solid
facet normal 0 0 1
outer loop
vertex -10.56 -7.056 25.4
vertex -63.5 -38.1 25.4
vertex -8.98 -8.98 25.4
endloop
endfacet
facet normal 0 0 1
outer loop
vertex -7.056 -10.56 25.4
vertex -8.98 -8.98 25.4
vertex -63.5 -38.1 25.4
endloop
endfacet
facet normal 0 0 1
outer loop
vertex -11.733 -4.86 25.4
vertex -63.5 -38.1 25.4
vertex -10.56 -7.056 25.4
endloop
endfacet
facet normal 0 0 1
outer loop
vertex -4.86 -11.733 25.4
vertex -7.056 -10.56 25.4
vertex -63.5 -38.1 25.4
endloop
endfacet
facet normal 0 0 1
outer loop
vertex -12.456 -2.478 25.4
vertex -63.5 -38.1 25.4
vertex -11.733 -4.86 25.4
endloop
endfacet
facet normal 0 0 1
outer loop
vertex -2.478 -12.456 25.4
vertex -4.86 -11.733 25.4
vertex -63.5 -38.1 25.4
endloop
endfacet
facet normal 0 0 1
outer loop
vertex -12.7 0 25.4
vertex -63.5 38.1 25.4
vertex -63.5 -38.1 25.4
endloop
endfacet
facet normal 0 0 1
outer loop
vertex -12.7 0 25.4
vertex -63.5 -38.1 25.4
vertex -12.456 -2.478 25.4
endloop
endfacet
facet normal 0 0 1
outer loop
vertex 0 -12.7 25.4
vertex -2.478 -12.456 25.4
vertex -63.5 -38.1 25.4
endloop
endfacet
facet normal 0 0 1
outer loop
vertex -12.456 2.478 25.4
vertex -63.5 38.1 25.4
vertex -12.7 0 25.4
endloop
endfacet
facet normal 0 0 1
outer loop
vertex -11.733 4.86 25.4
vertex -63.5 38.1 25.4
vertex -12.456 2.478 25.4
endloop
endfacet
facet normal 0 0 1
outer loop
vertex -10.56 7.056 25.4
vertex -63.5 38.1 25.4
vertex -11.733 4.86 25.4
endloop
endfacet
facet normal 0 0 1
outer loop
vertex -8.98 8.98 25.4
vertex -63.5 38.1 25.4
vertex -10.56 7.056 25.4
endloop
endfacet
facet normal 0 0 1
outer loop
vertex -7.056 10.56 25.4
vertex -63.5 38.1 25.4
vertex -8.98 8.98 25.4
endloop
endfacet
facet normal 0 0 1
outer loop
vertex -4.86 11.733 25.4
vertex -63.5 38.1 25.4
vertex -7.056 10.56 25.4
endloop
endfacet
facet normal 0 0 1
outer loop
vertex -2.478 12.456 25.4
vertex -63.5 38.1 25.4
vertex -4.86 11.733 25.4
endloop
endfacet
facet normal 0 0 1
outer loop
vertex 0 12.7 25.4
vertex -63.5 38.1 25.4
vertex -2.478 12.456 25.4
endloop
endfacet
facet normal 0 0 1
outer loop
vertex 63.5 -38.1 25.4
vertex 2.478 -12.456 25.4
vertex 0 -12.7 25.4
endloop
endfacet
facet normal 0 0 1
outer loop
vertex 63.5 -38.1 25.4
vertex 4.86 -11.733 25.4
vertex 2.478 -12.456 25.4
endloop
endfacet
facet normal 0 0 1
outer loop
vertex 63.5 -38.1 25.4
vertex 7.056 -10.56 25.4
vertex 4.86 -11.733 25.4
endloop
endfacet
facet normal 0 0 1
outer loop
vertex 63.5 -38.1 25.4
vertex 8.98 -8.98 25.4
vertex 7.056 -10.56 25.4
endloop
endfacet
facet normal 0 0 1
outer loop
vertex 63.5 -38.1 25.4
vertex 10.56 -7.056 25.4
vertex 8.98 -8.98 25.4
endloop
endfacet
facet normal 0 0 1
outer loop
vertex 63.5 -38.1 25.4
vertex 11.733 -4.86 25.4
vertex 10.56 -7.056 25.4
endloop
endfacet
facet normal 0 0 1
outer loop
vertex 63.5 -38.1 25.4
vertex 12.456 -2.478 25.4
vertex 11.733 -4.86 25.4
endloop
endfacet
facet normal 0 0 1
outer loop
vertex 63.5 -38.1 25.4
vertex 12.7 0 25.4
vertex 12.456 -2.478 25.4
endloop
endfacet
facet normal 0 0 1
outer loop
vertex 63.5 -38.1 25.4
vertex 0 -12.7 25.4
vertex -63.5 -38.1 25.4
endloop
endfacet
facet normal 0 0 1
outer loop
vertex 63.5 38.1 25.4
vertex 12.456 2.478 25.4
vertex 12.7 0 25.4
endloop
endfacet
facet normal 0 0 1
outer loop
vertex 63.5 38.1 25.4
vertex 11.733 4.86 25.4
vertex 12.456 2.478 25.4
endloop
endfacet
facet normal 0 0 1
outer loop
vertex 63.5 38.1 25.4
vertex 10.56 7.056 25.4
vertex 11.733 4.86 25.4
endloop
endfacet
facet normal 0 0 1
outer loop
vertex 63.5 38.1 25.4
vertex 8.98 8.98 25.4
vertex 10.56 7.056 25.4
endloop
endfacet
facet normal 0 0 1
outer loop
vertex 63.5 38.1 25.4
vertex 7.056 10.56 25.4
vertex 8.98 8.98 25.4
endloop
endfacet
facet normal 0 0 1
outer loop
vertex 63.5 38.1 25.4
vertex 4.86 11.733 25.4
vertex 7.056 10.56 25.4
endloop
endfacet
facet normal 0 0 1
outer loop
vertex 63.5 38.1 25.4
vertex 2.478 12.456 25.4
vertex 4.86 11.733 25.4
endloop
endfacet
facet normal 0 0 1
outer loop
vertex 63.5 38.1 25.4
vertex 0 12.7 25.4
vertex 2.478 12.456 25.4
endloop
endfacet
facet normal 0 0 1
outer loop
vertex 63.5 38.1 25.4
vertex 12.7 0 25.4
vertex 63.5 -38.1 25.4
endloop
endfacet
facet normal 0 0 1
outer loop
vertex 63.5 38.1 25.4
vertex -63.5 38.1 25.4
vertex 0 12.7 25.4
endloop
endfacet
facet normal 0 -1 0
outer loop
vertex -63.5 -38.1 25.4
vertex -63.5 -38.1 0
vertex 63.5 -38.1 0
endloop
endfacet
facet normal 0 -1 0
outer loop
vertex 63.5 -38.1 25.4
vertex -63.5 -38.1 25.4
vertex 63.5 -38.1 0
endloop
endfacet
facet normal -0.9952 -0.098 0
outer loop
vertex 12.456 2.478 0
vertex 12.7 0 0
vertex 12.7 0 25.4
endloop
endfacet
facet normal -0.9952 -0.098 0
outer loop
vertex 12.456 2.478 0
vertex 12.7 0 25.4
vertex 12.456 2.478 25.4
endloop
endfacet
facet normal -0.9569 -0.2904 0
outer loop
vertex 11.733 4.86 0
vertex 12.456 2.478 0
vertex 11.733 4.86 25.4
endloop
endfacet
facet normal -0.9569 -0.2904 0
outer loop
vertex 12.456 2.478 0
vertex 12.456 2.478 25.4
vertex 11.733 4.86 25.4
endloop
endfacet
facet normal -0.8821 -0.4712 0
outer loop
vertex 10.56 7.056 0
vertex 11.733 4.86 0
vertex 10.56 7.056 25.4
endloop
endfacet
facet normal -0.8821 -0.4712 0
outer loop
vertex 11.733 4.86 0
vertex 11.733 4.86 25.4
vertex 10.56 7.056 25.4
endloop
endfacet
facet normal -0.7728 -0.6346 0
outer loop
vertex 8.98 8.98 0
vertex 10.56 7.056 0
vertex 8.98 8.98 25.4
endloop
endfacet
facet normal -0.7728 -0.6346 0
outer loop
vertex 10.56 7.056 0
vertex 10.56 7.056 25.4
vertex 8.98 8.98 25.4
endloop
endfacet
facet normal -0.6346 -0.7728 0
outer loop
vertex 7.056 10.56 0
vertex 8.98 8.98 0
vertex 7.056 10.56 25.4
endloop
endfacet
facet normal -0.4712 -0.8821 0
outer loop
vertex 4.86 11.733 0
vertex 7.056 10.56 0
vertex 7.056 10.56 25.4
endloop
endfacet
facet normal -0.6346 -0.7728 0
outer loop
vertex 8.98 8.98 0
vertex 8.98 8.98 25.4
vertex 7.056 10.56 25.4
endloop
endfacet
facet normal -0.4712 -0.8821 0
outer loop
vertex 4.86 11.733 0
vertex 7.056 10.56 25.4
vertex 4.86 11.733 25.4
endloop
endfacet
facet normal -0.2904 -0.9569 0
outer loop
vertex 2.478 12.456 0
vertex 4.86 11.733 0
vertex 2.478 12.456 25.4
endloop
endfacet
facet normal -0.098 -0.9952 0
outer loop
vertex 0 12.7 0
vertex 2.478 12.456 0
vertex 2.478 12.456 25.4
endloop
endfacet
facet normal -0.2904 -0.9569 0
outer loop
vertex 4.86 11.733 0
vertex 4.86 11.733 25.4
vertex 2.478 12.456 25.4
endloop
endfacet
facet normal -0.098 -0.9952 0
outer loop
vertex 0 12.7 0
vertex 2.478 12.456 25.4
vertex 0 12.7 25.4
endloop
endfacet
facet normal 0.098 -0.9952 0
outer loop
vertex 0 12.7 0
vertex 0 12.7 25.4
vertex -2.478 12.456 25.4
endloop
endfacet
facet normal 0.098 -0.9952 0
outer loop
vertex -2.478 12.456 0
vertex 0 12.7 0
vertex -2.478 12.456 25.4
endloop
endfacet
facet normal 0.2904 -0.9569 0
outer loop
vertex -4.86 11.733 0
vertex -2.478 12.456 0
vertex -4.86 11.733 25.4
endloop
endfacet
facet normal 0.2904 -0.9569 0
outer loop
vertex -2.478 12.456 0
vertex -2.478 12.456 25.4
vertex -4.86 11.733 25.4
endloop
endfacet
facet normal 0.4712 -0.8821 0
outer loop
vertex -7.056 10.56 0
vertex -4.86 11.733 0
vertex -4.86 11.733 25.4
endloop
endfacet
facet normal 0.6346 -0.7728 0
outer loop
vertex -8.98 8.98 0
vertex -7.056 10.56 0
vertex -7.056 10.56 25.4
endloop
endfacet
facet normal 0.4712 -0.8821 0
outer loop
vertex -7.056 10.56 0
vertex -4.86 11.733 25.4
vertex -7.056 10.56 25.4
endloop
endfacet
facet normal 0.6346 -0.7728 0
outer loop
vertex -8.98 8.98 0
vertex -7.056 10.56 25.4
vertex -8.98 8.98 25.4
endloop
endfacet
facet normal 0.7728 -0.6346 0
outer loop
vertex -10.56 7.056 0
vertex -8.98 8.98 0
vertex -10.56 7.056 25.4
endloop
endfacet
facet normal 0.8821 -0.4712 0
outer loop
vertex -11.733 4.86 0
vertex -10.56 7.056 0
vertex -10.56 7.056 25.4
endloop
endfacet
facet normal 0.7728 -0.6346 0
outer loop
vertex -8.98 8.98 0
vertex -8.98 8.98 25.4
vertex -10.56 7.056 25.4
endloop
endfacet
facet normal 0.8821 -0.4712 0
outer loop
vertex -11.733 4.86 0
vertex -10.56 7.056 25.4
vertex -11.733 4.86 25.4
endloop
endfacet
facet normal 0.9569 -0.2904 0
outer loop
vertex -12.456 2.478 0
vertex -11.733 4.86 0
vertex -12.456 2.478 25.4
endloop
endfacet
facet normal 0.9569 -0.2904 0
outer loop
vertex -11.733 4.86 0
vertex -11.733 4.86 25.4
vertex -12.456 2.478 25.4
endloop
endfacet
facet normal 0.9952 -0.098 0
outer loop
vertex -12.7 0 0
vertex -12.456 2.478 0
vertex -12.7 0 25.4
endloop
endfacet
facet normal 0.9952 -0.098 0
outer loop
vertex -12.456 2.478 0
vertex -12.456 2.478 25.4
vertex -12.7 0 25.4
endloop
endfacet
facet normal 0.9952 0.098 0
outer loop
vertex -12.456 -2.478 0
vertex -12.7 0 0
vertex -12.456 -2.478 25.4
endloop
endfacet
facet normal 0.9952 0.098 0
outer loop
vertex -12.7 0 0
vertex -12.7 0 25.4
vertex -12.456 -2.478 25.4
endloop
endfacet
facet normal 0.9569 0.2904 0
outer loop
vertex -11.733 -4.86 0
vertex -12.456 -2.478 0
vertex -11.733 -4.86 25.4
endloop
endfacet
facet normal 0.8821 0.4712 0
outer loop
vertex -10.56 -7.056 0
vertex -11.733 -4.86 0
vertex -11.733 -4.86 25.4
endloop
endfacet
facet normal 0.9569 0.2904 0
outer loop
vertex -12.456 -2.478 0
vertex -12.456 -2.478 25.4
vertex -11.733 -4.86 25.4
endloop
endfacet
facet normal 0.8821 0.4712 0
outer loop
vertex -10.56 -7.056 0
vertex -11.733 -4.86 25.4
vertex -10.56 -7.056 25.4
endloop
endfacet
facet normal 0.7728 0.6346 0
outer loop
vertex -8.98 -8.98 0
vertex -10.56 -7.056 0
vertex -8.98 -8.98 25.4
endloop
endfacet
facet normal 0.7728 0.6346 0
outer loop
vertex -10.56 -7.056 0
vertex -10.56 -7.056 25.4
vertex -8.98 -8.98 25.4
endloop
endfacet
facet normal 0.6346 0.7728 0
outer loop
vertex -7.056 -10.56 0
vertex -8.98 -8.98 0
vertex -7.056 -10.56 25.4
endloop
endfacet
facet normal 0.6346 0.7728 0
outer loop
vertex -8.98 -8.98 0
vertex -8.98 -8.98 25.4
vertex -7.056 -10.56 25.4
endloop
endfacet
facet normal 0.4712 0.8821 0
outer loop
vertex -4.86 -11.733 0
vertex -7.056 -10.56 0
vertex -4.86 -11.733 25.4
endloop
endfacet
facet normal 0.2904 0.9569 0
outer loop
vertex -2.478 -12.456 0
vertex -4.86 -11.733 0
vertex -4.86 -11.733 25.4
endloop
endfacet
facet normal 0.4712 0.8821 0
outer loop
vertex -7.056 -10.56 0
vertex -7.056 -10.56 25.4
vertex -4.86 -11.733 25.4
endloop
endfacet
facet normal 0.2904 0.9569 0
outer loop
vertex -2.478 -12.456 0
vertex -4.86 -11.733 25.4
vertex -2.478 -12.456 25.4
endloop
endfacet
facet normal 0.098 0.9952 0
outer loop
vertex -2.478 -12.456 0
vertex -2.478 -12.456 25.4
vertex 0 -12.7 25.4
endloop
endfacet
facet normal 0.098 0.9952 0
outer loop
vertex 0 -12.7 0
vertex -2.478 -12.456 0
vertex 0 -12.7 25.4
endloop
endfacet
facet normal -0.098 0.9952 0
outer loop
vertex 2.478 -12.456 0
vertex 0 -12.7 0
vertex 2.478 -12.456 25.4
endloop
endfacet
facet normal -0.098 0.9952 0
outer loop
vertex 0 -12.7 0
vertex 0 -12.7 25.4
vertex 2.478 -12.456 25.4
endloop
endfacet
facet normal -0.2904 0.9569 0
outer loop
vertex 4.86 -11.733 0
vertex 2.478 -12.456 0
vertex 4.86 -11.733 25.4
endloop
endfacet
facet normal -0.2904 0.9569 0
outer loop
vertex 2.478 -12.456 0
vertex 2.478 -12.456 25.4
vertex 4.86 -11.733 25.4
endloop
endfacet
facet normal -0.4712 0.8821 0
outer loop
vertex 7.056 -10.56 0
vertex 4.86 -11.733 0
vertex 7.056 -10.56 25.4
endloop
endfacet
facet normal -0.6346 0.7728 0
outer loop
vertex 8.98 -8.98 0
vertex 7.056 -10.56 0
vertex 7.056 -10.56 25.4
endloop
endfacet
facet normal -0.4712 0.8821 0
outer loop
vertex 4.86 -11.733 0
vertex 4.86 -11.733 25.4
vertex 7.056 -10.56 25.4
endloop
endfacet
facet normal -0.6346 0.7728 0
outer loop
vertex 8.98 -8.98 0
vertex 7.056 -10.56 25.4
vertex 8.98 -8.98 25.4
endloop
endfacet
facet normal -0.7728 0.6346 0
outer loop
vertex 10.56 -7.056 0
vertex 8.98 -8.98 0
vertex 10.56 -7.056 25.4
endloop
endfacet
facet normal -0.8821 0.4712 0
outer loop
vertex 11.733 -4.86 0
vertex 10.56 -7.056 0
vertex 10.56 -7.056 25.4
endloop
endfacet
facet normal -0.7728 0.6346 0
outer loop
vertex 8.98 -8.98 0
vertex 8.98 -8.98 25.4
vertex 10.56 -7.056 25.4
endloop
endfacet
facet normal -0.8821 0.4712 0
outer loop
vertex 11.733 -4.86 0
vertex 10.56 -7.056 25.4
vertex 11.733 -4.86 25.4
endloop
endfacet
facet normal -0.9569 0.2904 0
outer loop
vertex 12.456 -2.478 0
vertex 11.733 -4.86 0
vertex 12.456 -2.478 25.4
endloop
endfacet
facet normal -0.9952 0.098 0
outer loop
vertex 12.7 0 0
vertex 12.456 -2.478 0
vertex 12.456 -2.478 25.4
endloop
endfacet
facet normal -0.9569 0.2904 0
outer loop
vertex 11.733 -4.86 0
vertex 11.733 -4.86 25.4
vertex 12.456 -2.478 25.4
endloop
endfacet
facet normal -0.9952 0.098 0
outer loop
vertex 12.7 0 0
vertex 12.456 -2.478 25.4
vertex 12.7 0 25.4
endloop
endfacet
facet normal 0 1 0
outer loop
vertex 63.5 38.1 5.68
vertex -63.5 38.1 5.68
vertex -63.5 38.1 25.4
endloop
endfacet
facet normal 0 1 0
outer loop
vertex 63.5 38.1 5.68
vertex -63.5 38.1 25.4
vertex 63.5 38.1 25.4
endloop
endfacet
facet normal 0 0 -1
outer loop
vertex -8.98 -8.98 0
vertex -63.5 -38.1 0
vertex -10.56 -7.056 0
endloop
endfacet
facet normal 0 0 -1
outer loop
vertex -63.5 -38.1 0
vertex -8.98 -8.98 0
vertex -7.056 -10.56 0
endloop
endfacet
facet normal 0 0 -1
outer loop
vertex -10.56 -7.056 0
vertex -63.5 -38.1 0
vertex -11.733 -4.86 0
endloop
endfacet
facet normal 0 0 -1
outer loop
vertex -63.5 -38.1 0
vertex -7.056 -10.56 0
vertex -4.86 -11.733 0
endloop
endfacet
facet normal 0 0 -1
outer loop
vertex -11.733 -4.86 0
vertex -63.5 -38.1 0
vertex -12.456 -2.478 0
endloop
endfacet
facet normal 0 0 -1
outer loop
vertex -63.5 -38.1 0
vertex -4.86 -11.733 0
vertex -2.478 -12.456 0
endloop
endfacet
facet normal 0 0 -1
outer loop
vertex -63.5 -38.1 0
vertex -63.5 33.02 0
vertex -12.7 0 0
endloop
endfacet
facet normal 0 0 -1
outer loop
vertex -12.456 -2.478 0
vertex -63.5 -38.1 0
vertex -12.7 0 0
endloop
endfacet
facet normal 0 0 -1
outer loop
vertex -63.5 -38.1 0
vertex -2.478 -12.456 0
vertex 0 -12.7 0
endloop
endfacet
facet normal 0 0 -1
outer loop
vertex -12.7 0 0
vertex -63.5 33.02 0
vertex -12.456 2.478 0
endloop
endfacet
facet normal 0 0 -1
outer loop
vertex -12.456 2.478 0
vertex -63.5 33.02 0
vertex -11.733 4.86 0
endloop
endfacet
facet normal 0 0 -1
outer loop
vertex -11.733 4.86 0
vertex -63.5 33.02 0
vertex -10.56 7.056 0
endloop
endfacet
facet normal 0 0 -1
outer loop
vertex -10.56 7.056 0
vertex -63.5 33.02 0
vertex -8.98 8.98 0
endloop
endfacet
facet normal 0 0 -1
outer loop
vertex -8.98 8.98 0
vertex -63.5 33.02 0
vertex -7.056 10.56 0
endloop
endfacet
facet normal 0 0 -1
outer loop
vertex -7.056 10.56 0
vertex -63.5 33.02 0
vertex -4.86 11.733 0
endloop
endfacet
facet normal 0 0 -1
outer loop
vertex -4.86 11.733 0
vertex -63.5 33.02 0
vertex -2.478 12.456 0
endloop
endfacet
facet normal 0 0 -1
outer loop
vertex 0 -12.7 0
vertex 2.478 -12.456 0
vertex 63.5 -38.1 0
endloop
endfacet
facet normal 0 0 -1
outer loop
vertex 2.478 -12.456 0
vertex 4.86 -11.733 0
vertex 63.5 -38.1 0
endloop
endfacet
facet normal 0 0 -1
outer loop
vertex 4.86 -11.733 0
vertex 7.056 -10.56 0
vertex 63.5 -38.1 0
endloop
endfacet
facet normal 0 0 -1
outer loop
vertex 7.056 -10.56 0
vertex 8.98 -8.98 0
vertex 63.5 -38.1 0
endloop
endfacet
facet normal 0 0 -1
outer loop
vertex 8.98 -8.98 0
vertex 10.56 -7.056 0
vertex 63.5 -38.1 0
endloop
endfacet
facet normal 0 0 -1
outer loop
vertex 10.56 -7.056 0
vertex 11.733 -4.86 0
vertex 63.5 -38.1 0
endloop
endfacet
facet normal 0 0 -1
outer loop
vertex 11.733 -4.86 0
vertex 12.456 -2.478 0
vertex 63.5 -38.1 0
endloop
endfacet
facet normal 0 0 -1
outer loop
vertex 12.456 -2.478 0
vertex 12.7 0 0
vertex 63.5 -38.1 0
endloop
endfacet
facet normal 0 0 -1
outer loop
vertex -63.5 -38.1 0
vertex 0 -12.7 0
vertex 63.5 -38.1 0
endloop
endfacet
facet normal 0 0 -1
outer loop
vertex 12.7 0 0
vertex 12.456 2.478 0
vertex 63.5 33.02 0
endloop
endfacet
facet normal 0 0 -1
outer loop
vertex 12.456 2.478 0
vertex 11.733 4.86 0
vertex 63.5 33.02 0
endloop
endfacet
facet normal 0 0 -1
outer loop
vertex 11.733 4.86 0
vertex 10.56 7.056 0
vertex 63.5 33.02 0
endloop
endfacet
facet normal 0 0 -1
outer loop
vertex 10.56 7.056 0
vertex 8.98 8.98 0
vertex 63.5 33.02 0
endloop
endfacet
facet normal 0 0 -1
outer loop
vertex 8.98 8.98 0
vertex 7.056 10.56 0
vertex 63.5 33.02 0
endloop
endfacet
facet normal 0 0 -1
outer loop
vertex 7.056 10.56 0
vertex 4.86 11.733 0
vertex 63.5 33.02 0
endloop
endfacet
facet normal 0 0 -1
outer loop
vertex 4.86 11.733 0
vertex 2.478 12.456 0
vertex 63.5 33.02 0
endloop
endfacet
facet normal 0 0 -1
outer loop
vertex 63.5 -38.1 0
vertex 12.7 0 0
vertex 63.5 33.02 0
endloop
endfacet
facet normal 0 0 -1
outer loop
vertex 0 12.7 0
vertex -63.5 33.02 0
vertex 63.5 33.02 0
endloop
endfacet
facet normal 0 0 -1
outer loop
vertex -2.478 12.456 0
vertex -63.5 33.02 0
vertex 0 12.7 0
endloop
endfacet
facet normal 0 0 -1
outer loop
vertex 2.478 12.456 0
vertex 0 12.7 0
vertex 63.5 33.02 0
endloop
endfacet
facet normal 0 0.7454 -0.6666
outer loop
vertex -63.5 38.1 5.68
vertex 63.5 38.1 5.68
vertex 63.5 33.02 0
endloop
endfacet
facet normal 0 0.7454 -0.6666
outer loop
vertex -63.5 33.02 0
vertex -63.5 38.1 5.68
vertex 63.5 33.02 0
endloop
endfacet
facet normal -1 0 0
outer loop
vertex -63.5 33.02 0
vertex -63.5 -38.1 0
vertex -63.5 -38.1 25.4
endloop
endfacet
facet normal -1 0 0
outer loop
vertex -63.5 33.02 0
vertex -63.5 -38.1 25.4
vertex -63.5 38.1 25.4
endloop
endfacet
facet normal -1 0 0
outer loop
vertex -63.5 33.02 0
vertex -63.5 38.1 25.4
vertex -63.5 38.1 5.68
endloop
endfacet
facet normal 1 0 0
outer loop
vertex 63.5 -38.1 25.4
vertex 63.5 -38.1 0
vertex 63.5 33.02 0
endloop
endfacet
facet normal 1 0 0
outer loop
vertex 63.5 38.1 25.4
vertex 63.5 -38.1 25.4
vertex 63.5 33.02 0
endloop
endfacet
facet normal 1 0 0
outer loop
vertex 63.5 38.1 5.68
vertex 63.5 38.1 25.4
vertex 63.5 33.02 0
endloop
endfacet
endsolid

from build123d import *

# Parameters (mm, degrees)
F0_W     = 127
F0_H     = 76.2
F0_R     = 19.05
F1_DEPTH = 25.4
F2_R     = 12.7
F3_DEPTH = 25.4
F5_DEPTH = 128.778


with BuildPart() as f1:
    # F0 (on Top) → F1 (new body)
    with BuildSketch(Plane.XY):
        Rectangle(F0_W, F0_H)
        Circle(F0_R, mode=Mode.SUBTRACT)
        Circle(F0_R)
    extrude(amount=F1_DEPTH)

    # F2 (on face) → F3 (cut)
    with BuildSketch(Plane.XY.offset(25.4)):
        Circle(F2_R)
    extrude(amount=-F3_DEPTH, mode=Mode.SUBTRACT)

    # F4 (on face) → F5 (cut)
    with BuildSketch(Plane.YZ.offset(63.5)):
        Polygon((38.1, 0), (38.1, 5.679613), (33.02, 0), align=None)
    extrude(amount=-F5_DEPTH, mode=Mode.SUBTRACT)


solid = f1.part
